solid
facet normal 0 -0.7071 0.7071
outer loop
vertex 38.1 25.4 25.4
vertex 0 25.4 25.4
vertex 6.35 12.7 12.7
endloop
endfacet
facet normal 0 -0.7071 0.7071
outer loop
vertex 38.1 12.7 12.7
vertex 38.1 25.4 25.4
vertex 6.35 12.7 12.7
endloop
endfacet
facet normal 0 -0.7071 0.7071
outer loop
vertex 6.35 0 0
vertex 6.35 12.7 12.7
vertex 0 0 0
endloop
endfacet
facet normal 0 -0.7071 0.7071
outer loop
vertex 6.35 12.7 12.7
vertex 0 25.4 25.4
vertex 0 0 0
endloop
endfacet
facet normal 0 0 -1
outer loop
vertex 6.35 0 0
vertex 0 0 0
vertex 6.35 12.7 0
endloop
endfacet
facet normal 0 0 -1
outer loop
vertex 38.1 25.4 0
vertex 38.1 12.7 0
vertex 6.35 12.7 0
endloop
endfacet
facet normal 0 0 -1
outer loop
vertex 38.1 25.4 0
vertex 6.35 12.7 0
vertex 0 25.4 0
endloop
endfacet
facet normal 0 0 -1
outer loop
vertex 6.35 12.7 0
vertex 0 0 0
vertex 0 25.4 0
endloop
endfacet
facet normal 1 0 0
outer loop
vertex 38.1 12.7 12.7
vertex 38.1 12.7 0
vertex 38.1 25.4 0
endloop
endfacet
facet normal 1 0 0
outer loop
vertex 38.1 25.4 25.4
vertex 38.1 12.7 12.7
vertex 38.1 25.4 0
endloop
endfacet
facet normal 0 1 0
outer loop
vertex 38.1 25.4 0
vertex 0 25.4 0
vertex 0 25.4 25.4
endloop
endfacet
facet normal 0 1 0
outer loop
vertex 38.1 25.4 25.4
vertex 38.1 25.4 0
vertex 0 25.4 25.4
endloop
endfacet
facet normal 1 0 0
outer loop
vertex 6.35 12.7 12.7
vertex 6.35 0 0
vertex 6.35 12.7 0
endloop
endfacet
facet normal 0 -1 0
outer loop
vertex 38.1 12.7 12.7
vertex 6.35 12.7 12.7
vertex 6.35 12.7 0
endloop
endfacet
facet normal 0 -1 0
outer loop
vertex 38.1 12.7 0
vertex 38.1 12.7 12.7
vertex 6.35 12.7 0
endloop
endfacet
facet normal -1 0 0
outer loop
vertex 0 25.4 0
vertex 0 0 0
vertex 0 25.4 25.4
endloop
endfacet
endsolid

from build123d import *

# Parameters (mm, degrees)
F1_DEPTH = 38.1
F3_DEPTH = 6.35


# Not quite as in the source:
# - the program builds the solid bodies; features that only make, move or delete a surface that nothing else refers to are left out


with BuildPart() as f1:
    # F0 (on Right) → F1 (new body)
    with BuildSketch(Plane.YZ):
        Polygon((12.7, 0), (25.4, 0), (25.4, 25.4), (12.7, 12.7), align=None)
    extrude(amount=F1_DEPTH)

    # F2 (on Right) → F3 (join)
    with BuildSketch(Plane.YZ):
        Polygon((12.7, 12.7), (0, 0), (12.7, 0), align=None)
    extrude(amount=F3_DEPTH)


solid = f1.part
